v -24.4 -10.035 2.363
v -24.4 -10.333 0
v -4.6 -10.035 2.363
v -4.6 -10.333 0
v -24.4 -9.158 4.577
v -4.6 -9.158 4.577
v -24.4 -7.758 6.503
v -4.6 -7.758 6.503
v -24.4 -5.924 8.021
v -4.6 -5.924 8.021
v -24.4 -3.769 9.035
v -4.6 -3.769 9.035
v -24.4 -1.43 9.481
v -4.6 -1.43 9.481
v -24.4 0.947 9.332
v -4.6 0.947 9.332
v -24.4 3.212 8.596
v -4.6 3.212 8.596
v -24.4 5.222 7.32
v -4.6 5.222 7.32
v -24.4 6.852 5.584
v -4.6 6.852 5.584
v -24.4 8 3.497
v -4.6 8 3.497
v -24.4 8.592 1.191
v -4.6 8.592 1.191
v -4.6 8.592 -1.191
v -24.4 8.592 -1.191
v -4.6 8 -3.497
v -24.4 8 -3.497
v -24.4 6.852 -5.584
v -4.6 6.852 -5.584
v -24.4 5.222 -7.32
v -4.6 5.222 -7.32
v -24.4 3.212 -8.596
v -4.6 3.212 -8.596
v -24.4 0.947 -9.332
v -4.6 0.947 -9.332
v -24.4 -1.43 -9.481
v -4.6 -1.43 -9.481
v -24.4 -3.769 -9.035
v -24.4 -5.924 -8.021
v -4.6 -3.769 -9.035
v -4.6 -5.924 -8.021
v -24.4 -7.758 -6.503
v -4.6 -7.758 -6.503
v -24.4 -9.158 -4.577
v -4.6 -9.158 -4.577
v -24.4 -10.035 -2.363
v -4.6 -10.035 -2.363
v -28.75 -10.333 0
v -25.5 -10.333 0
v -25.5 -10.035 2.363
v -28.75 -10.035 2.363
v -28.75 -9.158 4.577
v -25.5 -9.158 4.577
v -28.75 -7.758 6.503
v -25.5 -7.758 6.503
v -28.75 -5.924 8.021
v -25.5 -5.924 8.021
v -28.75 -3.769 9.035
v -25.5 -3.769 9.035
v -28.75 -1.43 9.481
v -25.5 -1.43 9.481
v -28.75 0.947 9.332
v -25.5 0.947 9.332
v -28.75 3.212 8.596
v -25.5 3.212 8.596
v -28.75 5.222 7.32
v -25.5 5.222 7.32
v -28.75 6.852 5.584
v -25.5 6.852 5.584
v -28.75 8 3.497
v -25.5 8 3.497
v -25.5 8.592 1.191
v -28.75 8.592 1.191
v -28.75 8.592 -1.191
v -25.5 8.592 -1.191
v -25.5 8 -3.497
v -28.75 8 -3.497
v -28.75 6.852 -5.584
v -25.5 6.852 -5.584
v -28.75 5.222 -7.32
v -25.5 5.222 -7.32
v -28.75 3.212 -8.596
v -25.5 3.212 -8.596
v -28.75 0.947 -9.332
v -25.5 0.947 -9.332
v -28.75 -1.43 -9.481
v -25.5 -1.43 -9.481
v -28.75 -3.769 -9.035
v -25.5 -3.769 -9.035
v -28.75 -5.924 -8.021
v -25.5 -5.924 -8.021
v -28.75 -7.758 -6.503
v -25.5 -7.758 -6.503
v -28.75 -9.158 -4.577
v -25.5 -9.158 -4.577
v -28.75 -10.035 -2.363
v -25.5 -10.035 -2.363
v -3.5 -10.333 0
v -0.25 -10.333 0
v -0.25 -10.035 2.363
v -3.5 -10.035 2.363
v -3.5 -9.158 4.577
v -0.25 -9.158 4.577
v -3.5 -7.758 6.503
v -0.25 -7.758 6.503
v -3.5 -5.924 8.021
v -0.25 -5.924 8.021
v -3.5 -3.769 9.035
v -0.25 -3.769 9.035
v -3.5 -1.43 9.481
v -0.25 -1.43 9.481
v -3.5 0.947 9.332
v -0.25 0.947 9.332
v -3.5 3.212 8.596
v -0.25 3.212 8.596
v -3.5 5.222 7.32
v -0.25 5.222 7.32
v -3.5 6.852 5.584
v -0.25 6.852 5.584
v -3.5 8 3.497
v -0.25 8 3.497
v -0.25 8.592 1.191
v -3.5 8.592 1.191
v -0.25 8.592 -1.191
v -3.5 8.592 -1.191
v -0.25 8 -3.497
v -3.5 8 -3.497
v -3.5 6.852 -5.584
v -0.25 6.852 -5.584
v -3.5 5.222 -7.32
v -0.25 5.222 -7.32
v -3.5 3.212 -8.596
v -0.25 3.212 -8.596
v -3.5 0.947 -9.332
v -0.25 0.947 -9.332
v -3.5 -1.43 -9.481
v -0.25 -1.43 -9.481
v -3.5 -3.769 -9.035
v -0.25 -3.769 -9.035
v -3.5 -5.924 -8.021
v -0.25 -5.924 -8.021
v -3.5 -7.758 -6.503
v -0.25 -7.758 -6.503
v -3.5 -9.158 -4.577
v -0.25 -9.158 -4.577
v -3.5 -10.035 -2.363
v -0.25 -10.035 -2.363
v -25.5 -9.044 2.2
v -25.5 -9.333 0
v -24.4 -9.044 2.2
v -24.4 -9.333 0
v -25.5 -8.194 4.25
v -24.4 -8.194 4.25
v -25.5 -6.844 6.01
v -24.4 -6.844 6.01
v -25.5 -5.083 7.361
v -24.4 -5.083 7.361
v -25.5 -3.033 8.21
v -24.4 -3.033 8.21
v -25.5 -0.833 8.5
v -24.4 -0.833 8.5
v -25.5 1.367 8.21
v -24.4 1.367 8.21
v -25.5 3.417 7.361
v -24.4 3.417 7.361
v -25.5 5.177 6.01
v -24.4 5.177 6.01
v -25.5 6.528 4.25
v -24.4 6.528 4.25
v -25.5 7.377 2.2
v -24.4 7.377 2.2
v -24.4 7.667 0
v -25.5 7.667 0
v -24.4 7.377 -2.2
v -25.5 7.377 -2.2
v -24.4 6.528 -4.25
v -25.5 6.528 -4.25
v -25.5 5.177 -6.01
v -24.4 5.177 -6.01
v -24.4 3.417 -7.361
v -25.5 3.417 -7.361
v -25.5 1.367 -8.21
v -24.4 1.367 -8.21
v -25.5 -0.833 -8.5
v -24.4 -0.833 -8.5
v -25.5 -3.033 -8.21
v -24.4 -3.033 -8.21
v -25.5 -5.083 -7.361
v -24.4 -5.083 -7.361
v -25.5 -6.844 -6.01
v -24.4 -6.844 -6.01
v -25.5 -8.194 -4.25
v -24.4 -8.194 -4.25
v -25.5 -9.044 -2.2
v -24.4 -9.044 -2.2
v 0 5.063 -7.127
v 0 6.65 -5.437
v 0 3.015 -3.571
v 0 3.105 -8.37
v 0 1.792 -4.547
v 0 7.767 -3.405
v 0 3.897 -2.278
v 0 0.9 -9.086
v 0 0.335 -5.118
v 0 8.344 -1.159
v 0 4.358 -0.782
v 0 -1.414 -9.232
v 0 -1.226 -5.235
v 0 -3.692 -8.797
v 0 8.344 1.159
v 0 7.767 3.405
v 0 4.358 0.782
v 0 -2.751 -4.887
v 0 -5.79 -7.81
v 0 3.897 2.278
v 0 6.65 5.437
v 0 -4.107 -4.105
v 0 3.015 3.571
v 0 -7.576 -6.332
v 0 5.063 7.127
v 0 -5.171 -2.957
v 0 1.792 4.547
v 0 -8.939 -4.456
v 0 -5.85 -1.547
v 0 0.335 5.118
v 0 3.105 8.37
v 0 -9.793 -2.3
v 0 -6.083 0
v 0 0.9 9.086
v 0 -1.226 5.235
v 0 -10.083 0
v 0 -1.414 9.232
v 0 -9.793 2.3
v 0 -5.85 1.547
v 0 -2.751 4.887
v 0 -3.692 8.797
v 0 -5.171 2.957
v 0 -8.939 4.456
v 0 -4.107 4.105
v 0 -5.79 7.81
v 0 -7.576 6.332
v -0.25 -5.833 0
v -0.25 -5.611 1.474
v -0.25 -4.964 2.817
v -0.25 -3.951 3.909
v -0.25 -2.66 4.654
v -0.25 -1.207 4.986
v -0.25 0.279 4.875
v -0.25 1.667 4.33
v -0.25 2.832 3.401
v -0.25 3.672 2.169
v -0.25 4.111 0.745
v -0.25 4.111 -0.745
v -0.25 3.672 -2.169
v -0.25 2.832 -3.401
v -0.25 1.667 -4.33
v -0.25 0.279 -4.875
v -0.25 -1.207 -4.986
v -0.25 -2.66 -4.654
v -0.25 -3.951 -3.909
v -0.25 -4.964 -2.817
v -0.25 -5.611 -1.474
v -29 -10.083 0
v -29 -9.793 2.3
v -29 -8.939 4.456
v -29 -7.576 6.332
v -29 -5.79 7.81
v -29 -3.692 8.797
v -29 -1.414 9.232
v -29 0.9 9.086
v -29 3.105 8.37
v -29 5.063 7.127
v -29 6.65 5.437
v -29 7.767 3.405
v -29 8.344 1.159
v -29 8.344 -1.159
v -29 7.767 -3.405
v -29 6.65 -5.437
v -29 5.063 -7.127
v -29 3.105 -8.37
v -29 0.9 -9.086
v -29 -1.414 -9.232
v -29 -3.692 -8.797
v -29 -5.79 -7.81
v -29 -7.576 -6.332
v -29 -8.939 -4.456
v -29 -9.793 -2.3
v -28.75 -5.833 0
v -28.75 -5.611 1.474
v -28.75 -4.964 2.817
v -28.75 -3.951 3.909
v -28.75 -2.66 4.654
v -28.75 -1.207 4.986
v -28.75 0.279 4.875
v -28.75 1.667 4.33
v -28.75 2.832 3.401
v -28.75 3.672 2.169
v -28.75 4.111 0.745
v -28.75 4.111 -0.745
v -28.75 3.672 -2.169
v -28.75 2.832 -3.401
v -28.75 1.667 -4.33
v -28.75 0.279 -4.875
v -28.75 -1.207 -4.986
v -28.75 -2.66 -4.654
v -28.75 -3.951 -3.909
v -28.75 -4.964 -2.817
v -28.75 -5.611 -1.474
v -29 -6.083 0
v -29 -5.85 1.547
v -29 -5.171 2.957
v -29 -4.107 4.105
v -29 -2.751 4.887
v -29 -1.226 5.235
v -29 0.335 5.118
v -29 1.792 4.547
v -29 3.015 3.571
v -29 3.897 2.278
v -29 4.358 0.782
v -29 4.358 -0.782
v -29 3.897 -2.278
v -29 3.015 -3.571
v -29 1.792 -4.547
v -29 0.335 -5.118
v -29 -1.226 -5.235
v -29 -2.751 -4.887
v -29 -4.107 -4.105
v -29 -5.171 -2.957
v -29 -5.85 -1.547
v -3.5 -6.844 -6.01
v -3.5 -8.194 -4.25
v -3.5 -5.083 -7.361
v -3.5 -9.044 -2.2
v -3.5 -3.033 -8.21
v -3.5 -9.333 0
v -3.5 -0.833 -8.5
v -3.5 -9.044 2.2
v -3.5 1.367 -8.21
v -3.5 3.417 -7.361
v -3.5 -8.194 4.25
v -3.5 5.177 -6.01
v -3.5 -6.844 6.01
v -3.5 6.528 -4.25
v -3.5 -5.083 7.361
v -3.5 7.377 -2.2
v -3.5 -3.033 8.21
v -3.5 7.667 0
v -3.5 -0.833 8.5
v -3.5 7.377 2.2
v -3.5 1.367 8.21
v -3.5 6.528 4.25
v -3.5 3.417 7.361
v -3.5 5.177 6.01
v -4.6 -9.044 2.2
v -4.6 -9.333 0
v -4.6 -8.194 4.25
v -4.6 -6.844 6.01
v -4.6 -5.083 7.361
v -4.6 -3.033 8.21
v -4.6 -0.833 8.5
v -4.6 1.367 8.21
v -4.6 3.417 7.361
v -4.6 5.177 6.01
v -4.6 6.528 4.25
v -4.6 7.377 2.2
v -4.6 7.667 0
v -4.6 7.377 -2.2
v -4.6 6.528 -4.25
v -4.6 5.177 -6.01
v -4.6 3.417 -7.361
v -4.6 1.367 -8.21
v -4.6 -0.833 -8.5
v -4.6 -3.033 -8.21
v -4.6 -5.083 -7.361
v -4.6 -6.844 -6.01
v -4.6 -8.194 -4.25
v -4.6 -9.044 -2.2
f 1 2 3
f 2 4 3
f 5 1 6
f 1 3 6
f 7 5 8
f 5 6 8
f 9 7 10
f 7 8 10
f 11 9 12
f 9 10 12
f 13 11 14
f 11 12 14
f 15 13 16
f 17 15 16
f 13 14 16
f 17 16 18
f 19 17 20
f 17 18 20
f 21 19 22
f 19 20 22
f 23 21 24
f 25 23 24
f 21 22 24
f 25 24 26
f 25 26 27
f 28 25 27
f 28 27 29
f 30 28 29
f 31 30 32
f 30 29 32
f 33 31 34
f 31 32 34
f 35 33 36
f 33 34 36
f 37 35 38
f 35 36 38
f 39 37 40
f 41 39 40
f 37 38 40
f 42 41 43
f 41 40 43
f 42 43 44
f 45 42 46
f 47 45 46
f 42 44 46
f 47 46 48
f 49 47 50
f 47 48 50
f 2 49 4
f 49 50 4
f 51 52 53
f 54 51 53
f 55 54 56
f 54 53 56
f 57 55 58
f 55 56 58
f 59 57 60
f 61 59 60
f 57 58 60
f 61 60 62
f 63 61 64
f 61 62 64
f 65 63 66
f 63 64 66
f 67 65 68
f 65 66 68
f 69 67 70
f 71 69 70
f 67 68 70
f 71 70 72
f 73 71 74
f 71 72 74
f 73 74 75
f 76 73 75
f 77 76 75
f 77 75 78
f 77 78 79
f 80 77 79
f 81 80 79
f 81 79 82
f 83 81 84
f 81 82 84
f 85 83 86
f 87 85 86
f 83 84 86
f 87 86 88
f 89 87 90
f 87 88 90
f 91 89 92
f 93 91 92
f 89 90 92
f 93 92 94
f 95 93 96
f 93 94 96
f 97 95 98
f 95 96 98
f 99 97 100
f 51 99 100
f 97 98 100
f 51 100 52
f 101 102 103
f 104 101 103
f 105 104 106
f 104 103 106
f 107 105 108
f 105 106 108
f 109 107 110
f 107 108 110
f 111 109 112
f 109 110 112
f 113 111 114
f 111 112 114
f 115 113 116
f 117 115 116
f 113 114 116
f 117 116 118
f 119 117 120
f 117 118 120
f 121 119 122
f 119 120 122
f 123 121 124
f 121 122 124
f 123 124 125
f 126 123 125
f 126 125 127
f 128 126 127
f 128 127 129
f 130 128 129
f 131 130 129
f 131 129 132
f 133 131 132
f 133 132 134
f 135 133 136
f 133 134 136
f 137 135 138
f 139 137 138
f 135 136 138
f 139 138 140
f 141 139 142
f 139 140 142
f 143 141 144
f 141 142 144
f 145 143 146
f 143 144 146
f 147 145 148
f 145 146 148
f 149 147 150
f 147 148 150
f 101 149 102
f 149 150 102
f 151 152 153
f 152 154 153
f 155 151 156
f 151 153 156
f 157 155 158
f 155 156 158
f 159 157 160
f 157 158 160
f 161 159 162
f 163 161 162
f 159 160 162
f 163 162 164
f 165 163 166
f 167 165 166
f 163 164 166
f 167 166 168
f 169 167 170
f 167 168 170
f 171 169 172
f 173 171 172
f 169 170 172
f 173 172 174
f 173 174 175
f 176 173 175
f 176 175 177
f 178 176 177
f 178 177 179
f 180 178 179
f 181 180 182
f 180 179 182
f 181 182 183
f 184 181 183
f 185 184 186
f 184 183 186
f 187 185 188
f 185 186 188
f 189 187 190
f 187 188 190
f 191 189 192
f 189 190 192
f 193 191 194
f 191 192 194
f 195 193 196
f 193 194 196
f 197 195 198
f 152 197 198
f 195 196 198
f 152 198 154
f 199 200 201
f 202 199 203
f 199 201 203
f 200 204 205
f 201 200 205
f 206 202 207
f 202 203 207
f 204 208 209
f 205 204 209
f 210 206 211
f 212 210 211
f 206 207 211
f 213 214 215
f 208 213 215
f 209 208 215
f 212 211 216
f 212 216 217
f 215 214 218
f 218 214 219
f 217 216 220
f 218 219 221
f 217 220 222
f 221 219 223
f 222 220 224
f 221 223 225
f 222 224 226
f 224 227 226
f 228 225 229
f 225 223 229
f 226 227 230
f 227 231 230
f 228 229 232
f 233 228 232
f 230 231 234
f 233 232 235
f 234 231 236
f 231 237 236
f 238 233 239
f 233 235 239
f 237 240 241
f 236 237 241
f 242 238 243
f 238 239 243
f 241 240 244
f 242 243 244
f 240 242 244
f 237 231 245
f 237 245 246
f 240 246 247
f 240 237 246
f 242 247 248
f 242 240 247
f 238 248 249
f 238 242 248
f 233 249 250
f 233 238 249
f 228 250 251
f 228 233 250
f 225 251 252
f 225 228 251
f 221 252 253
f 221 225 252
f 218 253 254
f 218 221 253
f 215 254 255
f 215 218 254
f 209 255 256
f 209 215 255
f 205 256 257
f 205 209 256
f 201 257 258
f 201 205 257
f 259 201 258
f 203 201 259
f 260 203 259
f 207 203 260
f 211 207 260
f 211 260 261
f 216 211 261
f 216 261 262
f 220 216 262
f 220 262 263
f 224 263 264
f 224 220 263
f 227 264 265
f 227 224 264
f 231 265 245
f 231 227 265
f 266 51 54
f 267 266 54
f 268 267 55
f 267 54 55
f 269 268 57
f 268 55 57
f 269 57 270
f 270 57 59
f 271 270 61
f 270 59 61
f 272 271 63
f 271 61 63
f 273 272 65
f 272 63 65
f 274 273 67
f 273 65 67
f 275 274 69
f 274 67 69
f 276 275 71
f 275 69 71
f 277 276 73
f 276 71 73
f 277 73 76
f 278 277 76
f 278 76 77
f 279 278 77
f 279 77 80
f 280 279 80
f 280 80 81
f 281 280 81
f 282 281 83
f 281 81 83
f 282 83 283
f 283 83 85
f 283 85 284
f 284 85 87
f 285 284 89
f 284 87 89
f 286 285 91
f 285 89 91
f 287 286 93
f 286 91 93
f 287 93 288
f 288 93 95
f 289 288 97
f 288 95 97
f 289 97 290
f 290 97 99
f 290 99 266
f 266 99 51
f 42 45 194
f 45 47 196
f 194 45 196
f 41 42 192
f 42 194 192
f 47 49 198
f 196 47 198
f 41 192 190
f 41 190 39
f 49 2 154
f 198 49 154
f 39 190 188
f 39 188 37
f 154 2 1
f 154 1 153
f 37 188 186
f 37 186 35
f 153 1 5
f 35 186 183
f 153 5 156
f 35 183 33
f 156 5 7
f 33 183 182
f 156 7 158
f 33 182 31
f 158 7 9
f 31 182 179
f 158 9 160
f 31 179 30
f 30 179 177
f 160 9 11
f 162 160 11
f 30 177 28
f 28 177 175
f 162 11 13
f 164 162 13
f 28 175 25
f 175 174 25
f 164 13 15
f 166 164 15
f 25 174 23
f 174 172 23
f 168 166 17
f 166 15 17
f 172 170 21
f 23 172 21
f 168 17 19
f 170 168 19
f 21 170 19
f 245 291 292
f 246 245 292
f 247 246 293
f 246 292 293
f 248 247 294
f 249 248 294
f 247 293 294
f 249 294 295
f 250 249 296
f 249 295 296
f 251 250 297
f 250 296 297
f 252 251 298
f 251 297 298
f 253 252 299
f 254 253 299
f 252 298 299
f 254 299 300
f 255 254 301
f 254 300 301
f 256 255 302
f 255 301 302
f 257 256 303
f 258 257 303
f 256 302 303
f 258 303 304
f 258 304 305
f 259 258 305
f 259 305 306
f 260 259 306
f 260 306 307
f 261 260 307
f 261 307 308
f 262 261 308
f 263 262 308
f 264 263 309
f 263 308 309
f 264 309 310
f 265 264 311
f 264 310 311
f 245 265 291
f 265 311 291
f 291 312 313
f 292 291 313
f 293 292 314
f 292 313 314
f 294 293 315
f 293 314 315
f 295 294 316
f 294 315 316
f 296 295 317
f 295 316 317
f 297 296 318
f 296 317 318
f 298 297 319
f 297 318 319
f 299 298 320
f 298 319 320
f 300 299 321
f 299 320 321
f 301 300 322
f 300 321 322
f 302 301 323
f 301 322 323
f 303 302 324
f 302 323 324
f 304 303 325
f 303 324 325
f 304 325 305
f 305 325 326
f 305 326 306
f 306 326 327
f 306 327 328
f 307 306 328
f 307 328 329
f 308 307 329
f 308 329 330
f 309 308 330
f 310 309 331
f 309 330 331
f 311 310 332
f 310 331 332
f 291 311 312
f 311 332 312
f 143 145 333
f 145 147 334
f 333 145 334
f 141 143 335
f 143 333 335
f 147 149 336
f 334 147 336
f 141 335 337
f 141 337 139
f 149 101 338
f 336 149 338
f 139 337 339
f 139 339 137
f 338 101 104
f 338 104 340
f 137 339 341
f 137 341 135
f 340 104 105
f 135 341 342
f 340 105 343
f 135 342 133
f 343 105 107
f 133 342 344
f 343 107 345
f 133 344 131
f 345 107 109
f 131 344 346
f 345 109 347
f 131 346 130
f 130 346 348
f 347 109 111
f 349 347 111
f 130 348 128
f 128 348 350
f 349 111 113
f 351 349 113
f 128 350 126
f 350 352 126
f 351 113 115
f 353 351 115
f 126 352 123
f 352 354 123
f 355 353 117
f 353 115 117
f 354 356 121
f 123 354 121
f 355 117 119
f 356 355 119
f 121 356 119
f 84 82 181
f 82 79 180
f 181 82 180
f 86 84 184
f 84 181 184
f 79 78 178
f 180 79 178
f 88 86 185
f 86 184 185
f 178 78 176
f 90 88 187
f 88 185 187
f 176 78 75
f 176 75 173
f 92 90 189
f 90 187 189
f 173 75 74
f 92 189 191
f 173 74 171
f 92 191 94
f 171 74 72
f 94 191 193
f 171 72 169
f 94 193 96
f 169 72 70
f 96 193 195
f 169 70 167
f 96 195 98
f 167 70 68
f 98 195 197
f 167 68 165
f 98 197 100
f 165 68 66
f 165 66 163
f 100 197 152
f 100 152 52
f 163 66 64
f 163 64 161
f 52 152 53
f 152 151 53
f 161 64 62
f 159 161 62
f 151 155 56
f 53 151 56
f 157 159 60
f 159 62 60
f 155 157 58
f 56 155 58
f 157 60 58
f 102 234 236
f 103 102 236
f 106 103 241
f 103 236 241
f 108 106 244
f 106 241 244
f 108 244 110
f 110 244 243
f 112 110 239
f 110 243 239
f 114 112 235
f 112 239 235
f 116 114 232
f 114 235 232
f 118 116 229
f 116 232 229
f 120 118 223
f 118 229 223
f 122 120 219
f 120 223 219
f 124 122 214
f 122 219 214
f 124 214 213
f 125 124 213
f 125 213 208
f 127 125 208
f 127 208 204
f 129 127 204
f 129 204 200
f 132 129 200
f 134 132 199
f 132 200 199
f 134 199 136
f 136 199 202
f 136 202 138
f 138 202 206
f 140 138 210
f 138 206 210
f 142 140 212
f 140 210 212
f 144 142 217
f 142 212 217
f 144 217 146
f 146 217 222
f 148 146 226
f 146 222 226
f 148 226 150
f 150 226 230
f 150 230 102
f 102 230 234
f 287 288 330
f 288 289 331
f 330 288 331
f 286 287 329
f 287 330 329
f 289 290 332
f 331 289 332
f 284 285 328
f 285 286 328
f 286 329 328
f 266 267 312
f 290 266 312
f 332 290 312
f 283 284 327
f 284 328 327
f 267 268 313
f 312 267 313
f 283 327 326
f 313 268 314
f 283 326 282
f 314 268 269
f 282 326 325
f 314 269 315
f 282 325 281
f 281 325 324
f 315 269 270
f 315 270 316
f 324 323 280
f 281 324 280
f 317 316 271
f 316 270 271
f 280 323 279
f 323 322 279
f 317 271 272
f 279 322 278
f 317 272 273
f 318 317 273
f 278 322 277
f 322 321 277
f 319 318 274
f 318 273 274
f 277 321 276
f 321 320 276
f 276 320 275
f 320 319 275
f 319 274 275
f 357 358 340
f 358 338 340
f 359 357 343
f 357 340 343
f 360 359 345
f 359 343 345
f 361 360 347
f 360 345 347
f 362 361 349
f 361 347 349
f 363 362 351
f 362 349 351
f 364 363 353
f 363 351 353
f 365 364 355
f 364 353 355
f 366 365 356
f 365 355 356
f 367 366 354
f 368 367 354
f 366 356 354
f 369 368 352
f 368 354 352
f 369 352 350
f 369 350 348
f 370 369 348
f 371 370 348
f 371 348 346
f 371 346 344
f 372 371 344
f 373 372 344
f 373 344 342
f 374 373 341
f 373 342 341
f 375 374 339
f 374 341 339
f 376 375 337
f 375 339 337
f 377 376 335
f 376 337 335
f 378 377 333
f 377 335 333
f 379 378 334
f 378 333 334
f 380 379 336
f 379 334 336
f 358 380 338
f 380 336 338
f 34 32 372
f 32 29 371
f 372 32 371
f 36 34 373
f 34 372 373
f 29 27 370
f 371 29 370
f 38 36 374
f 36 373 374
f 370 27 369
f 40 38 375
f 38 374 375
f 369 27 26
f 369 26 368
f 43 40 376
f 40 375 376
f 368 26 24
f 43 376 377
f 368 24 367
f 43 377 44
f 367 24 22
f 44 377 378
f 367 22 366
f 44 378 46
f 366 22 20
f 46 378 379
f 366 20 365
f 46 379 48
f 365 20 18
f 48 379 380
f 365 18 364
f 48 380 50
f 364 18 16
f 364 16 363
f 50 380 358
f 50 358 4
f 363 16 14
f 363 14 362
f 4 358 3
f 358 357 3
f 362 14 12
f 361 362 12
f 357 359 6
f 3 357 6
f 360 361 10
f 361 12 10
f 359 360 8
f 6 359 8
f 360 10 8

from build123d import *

# Parameters (mm, degrees)
F2_SIZE = 0.25


with BuildPart() as f1:
    # F0 (on Top) → F1 (revolve)
    with BuildSketch(Plane.XY):
        Polygon((0, -5.8332120482), (-29, -5.8332120482), (-29, -10.3332120482), (-25.5, -10.3332120482), (-25.5, -9.3332120482), (-24.4, -9.3332120482), (-24.4, -10.3332120482), (-4.6, -10.3332120482), (-4.6, -9.3332120482), (-3.5, -9.3332120482), (-3.5, -10.3332120482), (0, -10.3332120482), align=None)
    revolve(axis=Axis((-14.5, -0.8332120482, 0), (-1, 0, 0)))

    # F2
    f2_edges = [f1.edges().sort_by_distance(p)[0] for p in [
        (0, 8.666788, 0),
        (-29, 8.666788, 0),
        (-29, 4.166788, 0),
        (0, 4.166788, 0),
    ]]
    chamfer(f2_edges, length=F2_SIZE)


solid = f1.part
